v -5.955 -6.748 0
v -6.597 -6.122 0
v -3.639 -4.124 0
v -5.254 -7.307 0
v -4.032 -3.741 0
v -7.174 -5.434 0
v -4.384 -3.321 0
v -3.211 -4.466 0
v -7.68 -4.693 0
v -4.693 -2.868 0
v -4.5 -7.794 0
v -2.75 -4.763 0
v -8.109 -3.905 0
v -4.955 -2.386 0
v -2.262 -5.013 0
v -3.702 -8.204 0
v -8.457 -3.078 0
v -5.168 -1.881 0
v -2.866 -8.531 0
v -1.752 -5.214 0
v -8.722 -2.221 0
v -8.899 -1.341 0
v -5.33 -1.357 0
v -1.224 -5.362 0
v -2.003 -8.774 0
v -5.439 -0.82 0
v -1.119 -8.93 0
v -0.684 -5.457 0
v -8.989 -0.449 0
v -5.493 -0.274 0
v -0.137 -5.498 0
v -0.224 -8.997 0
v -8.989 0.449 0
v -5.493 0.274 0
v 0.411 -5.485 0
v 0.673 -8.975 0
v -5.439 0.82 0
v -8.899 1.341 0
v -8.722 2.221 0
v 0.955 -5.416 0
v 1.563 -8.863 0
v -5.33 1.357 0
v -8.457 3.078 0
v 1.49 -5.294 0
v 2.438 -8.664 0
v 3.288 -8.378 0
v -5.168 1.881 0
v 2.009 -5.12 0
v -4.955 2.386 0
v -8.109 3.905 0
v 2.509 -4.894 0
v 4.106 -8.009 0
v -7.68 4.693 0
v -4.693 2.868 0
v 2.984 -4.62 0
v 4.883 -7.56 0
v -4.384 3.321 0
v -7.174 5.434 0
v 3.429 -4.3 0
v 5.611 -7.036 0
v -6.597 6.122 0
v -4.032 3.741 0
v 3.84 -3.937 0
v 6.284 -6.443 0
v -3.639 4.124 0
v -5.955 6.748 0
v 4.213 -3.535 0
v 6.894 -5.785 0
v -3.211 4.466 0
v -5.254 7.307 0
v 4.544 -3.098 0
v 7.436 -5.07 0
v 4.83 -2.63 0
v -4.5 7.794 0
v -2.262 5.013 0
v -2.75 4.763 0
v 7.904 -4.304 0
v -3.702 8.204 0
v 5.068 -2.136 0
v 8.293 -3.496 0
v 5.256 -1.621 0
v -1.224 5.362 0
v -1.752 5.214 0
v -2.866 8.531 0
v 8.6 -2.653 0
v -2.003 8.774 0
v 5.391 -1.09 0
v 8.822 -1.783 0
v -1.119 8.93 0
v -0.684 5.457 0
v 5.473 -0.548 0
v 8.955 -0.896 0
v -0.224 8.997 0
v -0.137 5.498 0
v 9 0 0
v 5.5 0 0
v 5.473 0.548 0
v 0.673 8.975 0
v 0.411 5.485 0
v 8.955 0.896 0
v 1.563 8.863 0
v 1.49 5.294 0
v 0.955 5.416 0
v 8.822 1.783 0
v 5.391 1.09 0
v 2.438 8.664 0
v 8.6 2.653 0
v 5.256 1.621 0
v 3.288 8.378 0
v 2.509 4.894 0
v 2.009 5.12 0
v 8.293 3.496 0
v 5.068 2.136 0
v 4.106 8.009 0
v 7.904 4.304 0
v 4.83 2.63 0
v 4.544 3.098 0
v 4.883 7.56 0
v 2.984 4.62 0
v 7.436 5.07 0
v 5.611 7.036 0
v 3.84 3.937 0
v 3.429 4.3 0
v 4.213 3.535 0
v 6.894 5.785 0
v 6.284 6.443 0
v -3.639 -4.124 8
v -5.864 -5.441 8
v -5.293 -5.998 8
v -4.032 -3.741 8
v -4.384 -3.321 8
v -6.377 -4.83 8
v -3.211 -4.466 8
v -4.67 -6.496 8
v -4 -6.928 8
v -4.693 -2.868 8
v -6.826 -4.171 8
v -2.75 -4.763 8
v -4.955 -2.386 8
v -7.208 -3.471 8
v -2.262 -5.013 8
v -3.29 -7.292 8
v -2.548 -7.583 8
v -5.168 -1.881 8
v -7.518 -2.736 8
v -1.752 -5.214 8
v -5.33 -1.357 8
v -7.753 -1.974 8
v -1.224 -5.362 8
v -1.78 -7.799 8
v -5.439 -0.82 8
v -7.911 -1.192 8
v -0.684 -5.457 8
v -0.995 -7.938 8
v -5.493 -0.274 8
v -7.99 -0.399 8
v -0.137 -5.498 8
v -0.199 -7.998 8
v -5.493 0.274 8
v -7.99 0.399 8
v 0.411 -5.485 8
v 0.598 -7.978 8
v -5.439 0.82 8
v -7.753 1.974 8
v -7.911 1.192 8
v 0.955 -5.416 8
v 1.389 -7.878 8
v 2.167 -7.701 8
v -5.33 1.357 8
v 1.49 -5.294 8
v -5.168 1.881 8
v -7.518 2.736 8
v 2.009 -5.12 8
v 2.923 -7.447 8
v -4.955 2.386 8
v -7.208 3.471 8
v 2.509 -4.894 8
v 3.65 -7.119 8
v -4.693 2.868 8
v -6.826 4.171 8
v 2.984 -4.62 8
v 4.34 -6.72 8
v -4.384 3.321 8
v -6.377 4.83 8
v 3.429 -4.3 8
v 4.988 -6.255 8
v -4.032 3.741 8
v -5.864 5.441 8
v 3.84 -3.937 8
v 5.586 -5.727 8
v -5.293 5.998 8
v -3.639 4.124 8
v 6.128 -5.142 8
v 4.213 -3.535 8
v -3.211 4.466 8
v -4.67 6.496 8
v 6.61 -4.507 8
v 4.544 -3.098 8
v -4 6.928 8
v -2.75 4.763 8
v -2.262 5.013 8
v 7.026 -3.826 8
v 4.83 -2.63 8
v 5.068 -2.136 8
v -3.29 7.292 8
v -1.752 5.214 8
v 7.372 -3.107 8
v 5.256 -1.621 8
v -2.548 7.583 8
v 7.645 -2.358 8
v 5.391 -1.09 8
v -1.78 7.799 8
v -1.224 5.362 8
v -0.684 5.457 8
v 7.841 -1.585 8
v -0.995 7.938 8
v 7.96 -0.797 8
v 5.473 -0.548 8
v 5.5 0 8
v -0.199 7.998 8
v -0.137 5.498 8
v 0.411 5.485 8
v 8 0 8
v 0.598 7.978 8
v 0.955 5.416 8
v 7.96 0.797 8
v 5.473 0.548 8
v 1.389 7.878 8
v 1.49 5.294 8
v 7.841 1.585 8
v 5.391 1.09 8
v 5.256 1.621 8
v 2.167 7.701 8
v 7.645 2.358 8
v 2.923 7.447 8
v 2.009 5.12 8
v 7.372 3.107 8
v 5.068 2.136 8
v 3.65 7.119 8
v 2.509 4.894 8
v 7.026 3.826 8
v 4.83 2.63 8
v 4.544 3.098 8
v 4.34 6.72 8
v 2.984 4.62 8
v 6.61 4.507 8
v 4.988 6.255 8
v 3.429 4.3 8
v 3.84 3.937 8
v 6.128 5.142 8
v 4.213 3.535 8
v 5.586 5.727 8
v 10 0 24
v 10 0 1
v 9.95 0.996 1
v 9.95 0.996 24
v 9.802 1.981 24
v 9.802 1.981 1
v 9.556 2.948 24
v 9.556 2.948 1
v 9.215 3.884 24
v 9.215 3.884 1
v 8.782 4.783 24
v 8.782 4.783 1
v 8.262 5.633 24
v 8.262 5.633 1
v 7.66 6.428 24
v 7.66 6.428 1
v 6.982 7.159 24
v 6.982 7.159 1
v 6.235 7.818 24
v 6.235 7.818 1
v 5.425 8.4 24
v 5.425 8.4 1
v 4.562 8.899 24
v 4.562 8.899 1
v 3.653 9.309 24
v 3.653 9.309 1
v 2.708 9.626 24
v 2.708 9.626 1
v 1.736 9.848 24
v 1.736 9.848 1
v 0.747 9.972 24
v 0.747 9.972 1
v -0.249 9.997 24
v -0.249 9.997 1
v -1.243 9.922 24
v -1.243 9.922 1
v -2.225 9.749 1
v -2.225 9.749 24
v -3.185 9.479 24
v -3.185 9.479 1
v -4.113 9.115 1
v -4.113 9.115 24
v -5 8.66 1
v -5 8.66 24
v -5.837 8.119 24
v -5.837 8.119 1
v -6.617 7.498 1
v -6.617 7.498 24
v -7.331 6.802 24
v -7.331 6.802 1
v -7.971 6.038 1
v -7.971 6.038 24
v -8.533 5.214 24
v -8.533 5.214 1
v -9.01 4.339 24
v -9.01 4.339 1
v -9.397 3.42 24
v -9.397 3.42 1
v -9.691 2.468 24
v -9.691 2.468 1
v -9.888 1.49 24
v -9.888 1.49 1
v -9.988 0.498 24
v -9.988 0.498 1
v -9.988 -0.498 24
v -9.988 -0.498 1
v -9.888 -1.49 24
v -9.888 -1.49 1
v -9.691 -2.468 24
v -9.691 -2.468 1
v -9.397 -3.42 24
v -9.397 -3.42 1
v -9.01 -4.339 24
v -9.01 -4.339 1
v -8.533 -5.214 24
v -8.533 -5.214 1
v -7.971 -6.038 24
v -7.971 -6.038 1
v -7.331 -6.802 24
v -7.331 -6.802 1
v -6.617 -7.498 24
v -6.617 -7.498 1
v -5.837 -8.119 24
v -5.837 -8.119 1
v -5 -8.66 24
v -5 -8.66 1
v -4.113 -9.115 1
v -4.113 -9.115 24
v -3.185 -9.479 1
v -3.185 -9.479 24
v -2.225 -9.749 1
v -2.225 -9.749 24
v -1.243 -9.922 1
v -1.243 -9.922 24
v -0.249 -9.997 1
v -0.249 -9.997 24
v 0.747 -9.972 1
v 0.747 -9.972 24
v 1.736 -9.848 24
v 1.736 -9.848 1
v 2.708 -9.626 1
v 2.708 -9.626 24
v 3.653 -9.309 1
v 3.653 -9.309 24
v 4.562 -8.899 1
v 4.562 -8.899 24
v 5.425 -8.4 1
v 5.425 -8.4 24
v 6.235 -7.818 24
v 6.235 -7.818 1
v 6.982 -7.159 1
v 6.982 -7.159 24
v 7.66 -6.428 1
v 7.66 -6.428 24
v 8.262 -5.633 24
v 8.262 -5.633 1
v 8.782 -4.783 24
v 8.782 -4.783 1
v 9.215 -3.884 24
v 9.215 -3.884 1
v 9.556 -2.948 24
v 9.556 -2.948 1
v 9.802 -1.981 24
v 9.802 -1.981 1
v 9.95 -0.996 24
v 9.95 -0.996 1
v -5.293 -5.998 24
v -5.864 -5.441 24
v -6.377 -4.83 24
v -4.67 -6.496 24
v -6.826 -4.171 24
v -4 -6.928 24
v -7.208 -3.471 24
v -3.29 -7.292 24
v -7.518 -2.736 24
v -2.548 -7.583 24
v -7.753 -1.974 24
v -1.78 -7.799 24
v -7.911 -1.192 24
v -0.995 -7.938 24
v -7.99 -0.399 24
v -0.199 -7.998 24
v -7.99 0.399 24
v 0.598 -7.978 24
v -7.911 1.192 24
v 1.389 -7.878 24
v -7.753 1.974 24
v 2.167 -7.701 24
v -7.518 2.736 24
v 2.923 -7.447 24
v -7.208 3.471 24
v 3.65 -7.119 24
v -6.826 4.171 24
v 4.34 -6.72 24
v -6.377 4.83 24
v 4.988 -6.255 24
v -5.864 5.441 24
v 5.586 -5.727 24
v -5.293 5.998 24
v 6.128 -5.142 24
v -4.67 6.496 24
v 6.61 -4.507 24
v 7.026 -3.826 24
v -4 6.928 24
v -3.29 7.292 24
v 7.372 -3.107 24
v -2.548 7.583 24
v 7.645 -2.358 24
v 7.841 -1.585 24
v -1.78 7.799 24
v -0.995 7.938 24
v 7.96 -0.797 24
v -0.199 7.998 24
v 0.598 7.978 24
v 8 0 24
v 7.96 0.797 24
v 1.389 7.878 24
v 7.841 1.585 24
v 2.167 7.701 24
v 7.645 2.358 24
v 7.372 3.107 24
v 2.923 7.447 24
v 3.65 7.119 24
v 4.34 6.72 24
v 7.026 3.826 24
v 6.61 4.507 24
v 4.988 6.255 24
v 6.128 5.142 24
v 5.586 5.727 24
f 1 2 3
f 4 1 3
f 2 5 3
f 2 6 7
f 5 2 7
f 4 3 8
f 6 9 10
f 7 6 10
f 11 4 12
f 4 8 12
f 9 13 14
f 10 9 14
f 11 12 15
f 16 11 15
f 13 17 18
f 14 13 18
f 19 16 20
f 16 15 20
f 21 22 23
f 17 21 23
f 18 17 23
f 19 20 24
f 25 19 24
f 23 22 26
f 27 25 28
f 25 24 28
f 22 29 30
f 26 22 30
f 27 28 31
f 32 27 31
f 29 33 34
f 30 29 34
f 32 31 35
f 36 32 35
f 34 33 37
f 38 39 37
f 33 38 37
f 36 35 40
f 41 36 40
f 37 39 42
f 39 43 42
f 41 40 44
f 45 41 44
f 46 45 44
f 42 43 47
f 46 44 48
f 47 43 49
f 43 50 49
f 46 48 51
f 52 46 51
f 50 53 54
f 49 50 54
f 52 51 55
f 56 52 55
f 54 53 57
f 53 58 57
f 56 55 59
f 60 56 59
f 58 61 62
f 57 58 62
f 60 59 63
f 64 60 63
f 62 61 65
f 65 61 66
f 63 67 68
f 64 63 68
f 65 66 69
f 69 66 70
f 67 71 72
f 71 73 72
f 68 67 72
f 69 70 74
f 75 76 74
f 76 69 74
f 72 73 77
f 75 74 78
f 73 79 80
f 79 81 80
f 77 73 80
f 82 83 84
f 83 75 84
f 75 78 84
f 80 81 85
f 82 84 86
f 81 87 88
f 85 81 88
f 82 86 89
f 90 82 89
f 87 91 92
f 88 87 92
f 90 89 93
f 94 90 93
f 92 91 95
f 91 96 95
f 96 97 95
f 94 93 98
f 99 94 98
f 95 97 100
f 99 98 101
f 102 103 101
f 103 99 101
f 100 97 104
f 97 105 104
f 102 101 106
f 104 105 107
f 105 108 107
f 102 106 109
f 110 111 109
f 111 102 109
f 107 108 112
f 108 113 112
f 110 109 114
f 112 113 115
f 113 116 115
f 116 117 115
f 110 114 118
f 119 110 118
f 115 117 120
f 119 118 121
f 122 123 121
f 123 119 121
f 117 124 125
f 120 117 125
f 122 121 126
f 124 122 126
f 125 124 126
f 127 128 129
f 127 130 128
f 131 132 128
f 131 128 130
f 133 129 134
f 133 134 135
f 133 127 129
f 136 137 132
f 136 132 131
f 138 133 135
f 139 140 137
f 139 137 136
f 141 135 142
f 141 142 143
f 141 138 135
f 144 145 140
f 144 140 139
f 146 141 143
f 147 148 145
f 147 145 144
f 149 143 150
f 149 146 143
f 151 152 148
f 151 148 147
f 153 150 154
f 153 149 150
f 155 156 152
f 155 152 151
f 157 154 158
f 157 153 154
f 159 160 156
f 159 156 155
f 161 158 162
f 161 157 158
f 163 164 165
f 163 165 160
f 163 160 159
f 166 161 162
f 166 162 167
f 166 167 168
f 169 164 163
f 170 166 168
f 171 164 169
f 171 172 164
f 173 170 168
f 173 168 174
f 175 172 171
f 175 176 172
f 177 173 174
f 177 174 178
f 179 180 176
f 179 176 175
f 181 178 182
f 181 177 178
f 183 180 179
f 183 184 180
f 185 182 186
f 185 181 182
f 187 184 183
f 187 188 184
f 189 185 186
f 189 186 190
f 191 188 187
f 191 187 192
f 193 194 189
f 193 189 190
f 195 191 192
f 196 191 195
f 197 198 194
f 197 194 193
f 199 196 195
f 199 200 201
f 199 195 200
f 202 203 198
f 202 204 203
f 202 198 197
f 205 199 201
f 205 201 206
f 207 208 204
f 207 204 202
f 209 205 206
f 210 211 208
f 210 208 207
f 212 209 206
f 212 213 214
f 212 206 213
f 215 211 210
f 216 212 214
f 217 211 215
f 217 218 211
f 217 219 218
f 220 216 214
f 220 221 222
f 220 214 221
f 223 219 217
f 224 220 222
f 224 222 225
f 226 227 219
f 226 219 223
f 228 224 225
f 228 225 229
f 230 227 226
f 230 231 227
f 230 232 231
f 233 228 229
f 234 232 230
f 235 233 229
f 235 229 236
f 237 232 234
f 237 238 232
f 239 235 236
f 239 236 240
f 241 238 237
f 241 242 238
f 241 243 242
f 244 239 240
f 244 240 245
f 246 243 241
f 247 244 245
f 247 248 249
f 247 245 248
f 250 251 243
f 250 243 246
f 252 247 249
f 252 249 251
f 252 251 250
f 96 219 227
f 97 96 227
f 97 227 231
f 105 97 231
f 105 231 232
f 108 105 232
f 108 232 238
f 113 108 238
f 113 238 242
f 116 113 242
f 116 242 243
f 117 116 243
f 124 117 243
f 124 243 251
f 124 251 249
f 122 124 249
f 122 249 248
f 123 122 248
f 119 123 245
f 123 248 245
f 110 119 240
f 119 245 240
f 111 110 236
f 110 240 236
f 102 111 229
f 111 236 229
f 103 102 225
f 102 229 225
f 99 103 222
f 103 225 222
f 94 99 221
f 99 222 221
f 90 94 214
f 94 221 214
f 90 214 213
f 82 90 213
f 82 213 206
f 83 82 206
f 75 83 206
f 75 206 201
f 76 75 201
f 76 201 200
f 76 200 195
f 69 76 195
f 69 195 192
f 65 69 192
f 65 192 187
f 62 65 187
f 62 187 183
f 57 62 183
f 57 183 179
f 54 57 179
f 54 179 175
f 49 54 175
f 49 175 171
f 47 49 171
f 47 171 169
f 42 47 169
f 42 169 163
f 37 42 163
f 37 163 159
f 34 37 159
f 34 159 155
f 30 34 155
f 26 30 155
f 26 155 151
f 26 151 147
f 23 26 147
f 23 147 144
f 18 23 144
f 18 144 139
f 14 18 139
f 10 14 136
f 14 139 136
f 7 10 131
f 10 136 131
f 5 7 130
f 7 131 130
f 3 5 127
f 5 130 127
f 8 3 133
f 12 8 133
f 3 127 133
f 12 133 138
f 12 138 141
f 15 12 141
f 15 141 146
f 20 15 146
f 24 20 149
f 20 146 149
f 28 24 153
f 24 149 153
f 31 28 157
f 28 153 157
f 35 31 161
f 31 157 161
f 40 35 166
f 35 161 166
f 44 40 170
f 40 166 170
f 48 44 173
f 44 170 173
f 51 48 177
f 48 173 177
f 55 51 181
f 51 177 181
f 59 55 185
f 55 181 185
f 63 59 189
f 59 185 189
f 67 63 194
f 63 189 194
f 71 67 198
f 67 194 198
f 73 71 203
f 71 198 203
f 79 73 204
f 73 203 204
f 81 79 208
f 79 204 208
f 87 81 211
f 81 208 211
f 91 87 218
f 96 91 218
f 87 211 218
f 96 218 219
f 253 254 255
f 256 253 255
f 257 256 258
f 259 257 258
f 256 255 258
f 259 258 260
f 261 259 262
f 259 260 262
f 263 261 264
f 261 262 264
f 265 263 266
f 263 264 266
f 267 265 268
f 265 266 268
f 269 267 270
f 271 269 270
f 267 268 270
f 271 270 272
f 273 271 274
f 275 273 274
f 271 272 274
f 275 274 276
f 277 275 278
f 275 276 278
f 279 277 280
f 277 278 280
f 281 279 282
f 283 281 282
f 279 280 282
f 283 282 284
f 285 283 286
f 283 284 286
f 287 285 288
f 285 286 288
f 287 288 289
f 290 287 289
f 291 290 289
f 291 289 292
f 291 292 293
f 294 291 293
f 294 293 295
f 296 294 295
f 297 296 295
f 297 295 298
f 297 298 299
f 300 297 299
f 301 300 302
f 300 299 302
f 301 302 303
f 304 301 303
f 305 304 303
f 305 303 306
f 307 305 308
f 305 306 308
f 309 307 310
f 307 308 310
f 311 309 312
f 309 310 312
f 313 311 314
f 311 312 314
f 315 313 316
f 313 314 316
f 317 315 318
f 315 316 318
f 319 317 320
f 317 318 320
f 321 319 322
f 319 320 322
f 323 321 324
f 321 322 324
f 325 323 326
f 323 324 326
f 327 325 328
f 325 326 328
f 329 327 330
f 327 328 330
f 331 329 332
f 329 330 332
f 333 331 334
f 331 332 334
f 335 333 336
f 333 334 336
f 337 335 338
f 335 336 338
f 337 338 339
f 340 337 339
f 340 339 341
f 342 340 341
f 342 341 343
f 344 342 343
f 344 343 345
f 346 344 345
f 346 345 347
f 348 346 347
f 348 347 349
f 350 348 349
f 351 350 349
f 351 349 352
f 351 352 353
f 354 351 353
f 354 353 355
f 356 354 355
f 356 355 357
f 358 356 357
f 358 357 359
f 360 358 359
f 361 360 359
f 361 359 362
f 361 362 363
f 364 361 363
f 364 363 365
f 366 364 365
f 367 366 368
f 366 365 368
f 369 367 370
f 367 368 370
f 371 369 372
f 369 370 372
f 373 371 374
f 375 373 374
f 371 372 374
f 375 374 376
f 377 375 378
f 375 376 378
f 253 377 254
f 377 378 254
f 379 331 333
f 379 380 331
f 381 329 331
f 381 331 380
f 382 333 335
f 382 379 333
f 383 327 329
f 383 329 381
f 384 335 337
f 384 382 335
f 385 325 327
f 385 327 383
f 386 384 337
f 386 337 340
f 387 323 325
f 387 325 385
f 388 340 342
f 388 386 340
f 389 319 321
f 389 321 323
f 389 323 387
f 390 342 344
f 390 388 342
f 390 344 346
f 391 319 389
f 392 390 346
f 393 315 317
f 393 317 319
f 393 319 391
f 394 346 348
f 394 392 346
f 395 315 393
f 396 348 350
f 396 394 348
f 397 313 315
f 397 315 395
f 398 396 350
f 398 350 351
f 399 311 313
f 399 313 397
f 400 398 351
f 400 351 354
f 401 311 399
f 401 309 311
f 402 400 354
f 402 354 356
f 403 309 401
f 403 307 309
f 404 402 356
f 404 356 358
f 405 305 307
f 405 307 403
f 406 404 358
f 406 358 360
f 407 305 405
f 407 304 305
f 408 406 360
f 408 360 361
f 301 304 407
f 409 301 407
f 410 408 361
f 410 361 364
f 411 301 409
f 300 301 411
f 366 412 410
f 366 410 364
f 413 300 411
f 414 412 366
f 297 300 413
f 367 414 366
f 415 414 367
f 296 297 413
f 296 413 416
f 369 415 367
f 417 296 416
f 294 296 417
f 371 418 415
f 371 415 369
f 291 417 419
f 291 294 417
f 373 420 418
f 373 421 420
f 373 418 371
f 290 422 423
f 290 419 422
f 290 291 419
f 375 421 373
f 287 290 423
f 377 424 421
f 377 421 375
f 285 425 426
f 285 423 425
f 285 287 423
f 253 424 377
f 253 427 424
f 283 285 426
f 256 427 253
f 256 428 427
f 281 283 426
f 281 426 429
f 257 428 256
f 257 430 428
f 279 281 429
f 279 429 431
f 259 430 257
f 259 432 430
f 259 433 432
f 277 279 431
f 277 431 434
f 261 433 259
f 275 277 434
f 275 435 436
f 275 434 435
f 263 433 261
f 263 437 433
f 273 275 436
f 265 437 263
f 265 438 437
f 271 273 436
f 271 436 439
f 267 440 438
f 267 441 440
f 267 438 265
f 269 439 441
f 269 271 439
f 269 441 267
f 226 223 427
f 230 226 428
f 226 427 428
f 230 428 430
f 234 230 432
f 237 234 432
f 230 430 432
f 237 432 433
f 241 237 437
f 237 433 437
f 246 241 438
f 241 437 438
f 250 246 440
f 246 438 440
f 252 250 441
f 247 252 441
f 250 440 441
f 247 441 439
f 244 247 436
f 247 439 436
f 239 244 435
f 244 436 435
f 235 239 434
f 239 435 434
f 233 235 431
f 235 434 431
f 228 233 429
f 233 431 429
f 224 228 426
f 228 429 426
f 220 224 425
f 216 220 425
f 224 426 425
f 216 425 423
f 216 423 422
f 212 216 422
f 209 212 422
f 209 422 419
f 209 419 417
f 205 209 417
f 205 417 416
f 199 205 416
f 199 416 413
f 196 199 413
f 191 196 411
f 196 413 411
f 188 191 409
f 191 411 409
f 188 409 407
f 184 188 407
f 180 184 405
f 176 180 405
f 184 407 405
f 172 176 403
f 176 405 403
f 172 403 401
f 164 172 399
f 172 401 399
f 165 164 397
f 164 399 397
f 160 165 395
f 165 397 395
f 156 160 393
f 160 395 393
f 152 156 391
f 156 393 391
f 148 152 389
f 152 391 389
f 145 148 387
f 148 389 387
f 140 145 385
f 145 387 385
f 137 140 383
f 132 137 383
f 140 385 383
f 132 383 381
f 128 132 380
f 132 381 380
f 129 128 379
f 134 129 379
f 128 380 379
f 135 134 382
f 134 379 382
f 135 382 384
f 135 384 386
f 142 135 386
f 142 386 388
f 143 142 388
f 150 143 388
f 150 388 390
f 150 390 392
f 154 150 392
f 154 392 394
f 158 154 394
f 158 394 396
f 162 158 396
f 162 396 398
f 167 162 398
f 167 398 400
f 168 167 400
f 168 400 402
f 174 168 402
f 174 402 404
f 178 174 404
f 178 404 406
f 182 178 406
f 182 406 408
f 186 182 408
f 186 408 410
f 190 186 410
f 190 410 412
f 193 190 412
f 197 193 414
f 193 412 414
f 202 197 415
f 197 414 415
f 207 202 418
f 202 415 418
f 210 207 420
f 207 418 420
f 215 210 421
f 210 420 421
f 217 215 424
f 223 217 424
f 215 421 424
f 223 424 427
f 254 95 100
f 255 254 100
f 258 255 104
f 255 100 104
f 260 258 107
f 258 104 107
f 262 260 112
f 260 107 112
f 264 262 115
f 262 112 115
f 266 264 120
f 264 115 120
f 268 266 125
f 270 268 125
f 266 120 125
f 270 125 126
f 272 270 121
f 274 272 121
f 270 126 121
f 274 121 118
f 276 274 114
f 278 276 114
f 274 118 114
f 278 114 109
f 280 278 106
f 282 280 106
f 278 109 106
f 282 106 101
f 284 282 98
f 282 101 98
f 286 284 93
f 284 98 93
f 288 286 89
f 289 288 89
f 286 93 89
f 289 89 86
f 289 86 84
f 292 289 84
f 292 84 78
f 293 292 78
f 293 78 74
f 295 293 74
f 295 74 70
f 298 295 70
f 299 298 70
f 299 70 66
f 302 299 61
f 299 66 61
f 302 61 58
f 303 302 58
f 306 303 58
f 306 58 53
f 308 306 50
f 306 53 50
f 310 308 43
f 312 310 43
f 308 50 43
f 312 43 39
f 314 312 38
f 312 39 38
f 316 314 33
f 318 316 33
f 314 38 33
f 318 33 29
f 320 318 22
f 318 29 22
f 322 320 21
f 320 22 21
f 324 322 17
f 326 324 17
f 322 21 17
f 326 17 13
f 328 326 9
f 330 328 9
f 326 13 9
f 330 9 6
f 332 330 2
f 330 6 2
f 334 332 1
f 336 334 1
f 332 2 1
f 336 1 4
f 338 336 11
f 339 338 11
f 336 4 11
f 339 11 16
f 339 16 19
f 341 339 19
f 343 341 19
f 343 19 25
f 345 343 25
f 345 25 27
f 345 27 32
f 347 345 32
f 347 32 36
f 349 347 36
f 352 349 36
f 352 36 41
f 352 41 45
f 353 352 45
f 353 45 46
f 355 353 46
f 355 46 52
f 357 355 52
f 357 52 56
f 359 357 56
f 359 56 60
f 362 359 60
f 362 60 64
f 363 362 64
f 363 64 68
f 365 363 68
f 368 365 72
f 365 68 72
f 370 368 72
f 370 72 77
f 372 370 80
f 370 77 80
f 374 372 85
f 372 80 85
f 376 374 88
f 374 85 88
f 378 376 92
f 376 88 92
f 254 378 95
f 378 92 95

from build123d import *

# Parameters (mm, degrees)
F0_R     = 10
F1_DEPTH = 24
F2_SIZE  = 1
F3_R     = 5.5
F4_DEPTH = 24.001
F5_R     = 8
F6_DEPTH = 16


with BuildPart() as f1:
    # F0 (on Top) → F1 (new body)
    with BuildSketch(Plane.XY):
        Circle(F0_R)
    extrude(amount=F1_DEPTH)

    # F2
    f2_edges = [f1.edges().sort_by_distance(p)[0] for p in [
        (-10, 0, 0),
    ]]
    chamfer(f2_edges, length=F2_SIZE)

    # F3 (on face) → F4 (cut, through all)
    with BuildSketch(Plane.XY.offset(24)):
        Circle(F3_R)
    extrude(amount=-F4_DEPTH, mode=Mode.SUBTRACT)

    # F5 (on face) → F6 (cut)
    with BuildSketch(Plane.XY.offset(24)):
        Circle(F5_R)
    extrude(amount=-F6_DEPTH, mode=Mode.SUBTRACT)


solid = f1.part
